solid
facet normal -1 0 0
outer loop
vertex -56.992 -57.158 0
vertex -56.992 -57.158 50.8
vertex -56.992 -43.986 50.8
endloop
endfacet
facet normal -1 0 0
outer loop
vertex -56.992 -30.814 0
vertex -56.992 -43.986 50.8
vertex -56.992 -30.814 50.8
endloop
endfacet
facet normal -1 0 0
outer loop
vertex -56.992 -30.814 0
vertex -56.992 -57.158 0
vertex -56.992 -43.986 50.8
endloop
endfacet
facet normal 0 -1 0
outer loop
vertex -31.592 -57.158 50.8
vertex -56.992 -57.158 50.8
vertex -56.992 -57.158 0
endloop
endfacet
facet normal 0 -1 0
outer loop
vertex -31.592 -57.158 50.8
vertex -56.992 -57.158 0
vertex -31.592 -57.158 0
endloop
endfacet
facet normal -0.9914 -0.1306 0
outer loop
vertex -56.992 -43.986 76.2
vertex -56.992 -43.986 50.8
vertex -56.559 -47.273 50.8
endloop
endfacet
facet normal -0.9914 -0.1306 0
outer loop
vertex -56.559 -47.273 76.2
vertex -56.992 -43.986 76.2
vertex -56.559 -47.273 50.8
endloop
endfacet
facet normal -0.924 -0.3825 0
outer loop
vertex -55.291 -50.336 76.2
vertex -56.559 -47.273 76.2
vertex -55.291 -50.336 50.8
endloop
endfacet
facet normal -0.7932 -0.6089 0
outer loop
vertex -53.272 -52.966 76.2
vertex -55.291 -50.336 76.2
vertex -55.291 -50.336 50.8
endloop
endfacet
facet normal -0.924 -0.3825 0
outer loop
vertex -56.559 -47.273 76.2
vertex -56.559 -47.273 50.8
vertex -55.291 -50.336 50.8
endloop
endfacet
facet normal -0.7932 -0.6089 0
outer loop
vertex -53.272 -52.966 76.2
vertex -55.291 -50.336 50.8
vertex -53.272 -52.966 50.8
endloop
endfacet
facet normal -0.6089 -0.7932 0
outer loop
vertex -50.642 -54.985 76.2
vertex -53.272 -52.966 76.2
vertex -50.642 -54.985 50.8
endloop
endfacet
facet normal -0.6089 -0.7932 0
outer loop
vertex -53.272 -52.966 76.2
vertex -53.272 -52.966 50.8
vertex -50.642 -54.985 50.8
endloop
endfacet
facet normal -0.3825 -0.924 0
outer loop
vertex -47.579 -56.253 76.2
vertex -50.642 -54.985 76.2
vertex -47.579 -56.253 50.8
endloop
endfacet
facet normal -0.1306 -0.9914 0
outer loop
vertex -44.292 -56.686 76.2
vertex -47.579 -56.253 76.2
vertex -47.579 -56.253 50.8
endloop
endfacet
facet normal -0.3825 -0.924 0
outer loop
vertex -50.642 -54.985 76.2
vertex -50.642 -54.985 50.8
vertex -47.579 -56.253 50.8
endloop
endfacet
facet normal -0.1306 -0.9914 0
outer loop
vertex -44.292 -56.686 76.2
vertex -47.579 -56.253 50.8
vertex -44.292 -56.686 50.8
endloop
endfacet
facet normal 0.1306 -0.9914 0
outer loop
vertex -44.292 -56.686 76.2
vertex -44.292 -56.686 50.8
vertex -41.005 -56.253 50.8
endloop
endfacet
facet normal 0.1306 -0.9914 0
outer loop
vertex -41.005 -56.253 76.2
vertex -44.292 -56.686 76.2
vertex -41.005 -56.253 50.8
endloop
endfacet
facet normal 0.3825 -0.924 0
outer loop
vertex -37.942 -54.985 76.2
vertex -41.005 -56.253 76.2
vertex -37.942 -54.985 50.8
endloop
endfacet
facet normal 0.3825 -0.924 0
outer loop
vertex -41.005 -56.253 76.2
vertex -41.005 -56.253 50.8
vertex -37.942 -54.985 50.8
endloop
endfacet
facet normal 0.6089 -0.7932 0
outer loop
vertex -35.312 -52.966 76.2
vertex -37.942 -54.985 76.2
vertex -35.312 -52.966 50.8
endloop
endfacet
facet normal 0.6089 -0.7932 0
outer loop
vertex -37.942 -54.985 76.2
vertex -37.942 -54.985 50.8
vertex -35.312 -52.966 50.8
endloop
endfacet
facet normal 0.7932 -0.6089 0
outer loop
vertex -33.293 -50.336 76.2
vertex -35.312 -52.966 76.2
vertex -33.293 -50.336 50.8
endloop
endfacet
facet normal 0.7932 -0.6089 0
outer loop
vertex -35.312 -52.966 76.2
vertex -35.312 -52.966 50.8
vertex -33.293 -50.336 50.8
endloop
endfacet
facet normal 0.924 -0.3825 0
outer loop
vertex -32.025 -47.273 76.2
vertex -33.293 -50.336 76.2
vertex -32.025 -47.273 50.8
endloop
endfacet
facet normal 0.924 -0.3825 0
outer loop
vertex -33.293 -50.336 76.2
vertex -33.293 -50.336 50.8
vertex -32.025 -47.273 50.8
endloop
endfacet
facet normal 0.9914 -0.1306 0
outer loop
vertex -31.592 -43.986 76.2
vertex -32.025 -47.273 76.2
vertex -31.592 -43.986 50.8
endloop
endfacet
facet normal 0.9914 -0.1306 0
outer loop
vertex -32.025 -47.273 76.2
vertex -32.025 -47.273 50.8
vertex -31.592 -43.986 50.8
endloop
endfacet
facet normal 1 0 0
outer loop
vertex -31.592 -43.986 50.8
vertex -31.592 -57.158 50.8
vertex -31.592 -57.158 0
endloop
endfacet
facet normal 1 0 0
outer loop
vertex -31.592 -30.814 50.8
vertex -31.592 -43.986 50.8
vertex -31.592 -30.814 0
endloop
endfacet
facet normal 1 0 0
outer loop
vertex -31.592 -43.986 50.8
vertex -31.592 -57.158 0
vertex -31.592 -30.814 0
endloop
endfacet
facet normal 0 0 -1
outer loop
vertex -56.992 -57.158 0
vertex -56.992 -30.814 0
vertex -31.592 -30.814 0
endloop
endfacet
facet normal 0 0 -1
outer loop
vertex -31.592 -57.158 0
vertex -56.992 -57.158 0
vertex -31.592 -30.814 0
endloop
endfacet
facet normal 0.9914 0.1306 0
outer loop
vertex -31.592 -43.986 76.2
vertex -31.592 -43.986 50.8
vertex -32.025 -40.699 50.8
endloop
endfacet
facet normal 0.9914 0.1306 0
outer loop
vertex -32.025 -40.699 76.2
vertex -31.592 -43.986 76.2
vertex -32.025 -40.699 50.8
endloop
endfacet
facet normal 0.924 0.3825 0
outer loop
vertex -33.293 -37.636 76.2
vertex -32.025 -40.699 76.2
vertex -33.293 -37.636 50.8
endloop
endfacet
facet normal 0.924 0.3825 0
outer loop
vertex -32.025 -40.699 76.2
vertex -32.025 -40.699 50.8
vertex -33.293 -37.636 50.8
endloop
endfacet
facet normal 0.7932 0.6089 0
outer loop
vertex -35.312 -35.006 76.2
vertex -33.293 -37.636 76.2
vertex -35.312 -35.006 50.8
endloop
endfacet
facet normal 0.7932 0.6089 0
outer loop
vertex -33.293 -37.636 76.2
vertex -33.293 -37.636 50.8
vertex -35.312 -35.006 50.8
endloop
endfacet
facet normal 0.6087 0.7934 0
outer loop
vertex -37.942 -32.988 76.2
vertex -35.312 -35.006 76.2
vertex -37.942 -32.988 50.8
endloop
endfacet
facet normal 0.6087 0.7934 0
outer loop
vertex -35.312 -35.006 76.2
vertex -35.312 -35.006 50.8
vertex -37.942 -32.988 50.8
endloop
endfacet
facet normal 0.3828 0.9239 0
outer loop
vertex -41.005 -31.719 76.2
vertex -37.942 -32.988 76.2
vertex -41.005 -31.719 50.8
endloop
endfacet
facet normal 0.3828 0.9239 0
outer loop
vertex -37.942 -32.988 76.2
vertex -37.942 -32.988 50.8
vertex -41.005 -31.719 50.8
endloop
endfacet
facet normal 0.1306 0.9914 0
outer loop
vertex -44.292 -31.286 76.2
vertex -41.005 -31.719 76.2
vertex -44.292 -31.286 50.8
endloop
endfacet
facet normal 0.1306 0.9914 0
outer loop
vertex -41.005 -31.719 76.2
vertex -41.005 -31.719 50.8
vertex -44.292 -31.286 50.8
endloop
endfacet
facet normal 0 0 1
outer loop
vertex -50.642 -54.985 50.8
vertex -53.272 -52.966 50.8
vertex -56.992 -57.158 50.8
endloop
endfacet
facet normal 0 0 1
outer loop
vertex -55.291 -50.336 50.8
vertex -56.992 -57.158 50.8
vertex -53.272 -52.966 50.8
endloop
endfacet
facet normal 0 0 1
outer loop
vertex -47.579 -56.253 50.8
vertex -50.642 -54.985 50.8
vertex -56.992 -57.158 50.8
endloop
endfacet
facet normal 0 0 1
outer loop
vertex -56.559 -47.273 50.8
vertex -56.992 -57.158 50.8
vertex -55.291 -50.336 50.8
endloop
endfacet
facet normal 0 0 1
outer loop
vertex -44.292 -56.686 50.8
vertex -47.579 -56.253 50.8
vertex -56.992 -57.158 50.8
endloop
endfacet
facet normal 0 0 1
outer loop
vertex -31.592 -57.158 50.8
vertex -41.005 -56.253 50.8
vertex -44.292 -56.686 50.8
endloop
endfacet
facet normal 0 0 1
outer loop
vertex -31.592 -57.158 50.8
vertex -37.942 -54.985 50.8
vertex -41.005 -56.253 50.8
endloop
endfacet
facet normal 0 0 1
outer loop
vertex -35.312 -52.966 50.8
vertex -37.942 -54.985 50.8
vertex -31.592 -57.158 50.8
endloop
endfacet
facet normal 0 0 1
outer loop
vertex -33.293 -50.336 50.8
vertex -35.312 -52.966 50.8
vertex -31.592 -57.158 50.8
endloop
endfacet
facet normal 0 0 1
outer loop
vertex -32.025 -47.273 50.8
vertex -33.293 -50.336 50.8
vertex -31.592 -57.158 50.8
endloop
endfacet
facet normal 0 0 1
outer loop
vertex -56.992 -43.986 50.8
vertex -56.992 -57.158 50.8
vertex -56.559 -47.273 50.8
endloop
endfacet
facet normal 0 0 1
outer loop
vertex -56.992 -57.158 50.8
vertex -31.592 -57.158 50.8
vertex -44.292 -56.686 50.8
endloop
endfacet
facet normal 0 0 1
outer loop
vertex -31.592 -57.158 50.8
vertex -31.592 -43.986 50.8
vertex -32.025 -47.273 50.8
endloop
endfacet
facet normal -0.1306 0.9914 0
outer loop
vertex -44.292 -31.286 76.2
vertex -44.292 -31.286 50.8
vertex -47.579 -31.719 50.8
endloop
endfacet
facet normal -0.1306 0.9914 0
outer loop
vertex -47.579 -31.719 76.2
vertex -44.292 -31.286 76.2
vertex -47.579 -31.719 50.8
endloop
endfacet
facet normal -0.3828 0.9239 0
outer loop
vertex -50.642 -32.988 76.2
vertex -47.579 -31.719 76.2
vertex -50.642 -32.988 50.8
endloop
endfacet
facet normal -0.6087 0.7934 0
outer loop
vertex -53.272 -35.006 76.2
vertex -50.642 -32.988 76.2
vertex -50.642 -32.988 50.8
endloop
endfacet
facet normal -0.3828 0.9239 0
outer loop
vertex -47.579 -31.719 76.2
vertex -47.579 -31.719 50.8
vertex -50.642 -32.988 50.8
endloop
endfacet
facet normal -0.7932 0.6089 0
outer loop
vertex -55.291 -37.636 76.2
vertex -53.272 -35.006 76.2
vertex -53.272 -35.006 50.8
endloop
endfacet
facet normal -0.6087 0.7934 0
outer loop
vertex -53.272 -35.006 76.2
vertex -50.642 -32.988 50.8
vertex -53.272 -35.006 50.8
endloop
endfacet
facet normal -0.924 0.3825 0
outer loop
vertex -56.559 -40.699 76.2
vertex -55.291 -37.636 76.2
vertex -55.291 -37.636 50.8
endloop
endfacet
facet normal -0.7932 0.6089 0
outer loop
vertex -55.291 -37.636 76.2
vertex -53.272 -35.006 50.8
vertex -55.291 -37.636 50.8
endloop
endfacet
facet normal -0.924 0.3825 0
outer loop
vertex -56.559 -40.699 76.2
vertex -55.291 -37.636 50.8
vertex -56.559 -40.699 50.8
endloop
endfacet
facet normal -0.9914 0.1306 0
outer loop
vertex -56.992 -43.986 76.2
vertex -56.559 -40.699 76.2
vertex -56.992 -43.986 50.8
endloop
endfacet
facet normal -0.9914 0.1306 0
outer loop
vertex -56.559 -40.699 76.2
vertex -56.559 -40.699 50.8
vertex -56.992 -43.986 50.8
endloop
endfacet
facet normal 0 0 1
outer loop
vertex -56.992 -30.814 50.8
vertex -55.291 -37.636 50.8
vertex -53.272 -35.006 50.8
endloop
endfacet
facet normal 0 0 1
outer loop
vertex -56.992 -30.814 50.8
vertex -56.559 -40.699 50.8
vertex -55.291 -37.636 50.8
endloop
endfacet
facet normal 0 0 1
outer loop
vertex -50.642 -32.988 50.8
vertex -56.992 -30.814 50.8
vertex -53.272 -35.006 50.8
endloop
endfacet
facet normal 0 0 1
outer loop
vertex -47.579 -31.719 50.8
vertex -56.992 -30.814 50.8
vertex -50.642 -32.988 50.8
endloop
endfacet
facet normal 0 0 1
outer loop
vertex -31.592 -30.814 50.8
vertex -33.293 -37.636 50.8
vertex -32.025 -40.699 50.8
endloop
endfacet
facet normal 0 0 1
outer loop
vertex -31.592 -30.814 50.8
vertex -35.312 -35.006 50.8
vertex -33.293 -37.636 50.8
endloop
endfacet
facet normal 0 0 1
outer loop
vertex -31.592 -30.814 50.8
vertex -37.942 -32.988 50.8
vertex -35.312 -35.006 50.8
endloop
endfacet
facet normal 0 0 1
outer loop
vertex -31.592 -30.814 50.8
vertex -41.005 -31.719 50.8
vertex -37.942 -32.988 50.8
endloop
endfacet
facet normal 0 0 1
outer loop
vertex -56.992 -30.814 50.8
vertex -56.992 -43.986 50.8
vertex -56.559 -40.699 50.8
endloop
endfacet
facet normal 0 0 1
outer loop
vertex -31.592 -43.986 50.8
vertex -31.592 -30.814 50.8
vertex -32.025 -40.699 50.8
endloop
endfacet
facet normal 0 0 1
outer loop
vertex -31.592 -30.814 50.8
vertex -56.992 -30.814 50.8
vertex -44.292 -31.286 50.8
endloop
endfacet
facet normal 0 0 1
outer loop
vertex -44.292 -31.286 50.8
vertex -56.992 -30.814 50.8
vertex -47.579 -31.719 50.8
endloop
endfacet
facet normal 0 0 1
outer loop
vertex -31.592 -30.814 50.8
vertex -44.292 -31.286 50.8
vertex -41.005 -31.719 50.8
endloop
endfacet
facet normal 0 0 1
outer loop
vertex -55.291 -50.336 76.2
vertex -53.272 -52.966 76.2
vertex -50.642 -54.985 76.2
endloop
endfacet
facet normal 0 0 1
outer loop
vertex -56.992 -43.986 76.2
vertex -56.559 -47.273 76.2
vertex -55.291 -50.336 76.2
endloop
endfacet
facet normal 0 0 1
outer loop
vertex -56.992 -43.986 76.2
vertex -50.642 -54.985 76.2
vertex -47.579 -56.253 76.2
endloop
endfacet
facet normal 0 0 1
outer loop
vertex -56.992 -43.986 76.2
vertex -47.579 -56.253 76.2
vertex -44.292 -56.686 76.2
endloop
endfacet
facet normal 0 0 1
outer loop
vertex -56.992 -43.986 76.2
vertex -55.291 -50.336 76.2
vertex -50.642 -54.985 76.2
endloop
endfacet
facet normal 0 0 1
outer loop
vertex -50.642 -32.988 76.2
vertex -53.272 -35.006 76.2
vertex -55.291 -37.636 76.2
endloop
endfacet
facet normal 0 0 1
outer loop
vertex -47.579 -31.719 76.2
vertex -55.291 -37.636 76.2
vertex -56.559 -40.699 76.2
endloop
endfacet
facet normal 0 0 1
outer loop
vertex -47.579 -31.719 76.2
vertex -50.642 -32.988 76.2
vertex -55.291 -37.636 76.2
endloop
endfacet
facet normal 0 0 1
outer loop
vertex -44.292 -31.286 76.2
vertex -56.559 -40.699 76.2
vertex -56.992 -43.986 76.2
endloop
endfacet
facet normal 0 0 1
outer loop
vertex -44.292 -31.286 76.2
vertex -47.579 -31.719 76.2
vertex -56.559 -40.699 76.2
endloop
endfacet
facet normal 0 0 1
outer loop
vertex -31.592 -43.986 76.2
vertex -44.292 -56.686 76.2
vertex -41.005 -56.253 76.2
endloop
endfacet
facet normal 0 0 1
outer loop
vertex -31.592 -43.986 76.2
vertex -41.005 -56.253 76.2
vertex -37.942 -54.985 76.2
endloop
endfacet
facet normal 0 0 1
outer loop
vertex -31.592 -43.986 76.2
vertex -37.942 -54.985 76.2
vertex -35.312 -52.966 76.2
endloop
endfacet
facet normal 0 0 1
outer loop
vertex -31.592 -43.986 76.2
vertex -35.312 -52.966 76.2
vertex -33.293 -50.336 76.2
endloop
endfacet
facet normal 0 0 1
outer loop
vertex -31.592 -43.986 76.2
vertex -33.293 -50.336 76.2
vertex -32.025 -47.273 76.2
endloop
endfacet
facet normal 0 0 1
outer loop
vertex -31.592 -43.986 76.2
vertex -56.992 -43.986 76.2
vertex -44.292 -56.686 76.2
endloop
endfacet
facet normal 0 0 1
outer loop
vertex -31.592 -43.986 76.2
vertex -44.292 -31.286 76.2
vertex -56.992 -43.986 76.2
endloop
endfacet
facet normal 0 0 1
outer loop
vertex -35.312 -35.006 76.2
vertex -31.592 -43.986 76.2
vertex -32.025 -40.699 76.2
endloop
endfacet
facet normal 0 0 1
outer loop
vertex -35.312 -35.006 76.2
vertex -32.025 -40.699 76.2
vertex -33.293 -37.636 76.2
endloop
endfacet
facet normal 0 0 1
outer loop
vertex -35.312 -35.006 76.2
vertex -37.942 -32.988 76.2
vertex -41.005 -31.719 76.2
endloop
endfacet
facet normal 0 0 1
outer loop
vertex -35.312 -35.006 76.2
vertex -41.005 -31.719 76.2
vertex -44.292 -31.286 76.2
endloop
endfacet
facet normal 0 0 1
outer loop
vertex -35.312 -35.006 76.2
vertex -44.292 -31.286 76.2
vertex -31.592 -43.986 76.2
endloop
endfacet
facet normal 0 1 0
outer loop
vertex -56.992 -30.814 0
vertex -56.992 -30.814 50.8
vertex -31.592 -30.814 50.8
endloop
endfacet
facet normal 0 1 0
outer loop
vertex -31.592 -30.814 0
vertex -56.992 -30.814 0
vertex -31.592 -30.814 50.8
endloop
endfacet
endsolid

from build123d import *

# Parameters (mm, degrees)
F0_W     = 25.4
F0_H     = 26.3435523957
F1_DEPTH = 50.8
F3_DEPTH = 25.4


with BuildPart() as f1:
    # F0 (on Top) → F1 (new body)
    with BuildSketch(Plane.XY):
        with Locations((-44.2919794798, -43.9860569313)):
            Rectangle(F0_W, F0_H)
    extrude(amount=F1_DEPTH)

    # F2 (on face) → F3 (join)
    with BuildSketch(Plane.XY.offset(50.8)):
        with BuildLine():
            Line((-31.5919794798, -43.9860569313), (-44.2919794798, -43.9860569313))
            Line((-44.2919794798, -43.9860569313), (-44.2919794798, -56.6860569313))
            ThreePointArc((-44.2919794798, -56.6860569313), (-35.3117233587, -52.9663130524), (-31.5919794798, -43.9860569313))
        make_face()
        with BuildLine():
            ThreePointArc((-31.5919794798, -43.9860569313), (-35.3117233587, -35.0058008102), (-44.2919794798, -31.2860569313))
            Line((-44.2919794798, -31.2860569313), (-44.2919794798, -43.9860569313))
            Line((-44.2919794798, -43.9860569313), (-31.5919794798, -43.9860569313))
        make_face()
        with BuildLine():
            Line((-44.2919794798, -43.9860569313), (-44.2919794798, -31.2860569313))
            ThreePointArc((-44.2919794798, -31.2860569313), (-53.2722356009, -35.0058008102), (-56.9919794798, -43.9860569313))
            Line((-56.9919794798, -43.9860569313), (-44.2919794798, -43.9860569313))
        make_face()
        with BuildLine():
            Line((-44.2919794798, -56.6860569313), (-44.2919794798, -43.9860569313))
            Line((-44.2919794798, -43.9860569313), (-56.9919794798, -43.9860569313))
            ThreePointArc((-56.9919794798, -43.9860569313), (-53.2722356009, -52.9663130524), (-44.2919794798, -56.6860569313))
        make_face()
    extrude(amount=F3_DEPTH)


solid = f1.part
